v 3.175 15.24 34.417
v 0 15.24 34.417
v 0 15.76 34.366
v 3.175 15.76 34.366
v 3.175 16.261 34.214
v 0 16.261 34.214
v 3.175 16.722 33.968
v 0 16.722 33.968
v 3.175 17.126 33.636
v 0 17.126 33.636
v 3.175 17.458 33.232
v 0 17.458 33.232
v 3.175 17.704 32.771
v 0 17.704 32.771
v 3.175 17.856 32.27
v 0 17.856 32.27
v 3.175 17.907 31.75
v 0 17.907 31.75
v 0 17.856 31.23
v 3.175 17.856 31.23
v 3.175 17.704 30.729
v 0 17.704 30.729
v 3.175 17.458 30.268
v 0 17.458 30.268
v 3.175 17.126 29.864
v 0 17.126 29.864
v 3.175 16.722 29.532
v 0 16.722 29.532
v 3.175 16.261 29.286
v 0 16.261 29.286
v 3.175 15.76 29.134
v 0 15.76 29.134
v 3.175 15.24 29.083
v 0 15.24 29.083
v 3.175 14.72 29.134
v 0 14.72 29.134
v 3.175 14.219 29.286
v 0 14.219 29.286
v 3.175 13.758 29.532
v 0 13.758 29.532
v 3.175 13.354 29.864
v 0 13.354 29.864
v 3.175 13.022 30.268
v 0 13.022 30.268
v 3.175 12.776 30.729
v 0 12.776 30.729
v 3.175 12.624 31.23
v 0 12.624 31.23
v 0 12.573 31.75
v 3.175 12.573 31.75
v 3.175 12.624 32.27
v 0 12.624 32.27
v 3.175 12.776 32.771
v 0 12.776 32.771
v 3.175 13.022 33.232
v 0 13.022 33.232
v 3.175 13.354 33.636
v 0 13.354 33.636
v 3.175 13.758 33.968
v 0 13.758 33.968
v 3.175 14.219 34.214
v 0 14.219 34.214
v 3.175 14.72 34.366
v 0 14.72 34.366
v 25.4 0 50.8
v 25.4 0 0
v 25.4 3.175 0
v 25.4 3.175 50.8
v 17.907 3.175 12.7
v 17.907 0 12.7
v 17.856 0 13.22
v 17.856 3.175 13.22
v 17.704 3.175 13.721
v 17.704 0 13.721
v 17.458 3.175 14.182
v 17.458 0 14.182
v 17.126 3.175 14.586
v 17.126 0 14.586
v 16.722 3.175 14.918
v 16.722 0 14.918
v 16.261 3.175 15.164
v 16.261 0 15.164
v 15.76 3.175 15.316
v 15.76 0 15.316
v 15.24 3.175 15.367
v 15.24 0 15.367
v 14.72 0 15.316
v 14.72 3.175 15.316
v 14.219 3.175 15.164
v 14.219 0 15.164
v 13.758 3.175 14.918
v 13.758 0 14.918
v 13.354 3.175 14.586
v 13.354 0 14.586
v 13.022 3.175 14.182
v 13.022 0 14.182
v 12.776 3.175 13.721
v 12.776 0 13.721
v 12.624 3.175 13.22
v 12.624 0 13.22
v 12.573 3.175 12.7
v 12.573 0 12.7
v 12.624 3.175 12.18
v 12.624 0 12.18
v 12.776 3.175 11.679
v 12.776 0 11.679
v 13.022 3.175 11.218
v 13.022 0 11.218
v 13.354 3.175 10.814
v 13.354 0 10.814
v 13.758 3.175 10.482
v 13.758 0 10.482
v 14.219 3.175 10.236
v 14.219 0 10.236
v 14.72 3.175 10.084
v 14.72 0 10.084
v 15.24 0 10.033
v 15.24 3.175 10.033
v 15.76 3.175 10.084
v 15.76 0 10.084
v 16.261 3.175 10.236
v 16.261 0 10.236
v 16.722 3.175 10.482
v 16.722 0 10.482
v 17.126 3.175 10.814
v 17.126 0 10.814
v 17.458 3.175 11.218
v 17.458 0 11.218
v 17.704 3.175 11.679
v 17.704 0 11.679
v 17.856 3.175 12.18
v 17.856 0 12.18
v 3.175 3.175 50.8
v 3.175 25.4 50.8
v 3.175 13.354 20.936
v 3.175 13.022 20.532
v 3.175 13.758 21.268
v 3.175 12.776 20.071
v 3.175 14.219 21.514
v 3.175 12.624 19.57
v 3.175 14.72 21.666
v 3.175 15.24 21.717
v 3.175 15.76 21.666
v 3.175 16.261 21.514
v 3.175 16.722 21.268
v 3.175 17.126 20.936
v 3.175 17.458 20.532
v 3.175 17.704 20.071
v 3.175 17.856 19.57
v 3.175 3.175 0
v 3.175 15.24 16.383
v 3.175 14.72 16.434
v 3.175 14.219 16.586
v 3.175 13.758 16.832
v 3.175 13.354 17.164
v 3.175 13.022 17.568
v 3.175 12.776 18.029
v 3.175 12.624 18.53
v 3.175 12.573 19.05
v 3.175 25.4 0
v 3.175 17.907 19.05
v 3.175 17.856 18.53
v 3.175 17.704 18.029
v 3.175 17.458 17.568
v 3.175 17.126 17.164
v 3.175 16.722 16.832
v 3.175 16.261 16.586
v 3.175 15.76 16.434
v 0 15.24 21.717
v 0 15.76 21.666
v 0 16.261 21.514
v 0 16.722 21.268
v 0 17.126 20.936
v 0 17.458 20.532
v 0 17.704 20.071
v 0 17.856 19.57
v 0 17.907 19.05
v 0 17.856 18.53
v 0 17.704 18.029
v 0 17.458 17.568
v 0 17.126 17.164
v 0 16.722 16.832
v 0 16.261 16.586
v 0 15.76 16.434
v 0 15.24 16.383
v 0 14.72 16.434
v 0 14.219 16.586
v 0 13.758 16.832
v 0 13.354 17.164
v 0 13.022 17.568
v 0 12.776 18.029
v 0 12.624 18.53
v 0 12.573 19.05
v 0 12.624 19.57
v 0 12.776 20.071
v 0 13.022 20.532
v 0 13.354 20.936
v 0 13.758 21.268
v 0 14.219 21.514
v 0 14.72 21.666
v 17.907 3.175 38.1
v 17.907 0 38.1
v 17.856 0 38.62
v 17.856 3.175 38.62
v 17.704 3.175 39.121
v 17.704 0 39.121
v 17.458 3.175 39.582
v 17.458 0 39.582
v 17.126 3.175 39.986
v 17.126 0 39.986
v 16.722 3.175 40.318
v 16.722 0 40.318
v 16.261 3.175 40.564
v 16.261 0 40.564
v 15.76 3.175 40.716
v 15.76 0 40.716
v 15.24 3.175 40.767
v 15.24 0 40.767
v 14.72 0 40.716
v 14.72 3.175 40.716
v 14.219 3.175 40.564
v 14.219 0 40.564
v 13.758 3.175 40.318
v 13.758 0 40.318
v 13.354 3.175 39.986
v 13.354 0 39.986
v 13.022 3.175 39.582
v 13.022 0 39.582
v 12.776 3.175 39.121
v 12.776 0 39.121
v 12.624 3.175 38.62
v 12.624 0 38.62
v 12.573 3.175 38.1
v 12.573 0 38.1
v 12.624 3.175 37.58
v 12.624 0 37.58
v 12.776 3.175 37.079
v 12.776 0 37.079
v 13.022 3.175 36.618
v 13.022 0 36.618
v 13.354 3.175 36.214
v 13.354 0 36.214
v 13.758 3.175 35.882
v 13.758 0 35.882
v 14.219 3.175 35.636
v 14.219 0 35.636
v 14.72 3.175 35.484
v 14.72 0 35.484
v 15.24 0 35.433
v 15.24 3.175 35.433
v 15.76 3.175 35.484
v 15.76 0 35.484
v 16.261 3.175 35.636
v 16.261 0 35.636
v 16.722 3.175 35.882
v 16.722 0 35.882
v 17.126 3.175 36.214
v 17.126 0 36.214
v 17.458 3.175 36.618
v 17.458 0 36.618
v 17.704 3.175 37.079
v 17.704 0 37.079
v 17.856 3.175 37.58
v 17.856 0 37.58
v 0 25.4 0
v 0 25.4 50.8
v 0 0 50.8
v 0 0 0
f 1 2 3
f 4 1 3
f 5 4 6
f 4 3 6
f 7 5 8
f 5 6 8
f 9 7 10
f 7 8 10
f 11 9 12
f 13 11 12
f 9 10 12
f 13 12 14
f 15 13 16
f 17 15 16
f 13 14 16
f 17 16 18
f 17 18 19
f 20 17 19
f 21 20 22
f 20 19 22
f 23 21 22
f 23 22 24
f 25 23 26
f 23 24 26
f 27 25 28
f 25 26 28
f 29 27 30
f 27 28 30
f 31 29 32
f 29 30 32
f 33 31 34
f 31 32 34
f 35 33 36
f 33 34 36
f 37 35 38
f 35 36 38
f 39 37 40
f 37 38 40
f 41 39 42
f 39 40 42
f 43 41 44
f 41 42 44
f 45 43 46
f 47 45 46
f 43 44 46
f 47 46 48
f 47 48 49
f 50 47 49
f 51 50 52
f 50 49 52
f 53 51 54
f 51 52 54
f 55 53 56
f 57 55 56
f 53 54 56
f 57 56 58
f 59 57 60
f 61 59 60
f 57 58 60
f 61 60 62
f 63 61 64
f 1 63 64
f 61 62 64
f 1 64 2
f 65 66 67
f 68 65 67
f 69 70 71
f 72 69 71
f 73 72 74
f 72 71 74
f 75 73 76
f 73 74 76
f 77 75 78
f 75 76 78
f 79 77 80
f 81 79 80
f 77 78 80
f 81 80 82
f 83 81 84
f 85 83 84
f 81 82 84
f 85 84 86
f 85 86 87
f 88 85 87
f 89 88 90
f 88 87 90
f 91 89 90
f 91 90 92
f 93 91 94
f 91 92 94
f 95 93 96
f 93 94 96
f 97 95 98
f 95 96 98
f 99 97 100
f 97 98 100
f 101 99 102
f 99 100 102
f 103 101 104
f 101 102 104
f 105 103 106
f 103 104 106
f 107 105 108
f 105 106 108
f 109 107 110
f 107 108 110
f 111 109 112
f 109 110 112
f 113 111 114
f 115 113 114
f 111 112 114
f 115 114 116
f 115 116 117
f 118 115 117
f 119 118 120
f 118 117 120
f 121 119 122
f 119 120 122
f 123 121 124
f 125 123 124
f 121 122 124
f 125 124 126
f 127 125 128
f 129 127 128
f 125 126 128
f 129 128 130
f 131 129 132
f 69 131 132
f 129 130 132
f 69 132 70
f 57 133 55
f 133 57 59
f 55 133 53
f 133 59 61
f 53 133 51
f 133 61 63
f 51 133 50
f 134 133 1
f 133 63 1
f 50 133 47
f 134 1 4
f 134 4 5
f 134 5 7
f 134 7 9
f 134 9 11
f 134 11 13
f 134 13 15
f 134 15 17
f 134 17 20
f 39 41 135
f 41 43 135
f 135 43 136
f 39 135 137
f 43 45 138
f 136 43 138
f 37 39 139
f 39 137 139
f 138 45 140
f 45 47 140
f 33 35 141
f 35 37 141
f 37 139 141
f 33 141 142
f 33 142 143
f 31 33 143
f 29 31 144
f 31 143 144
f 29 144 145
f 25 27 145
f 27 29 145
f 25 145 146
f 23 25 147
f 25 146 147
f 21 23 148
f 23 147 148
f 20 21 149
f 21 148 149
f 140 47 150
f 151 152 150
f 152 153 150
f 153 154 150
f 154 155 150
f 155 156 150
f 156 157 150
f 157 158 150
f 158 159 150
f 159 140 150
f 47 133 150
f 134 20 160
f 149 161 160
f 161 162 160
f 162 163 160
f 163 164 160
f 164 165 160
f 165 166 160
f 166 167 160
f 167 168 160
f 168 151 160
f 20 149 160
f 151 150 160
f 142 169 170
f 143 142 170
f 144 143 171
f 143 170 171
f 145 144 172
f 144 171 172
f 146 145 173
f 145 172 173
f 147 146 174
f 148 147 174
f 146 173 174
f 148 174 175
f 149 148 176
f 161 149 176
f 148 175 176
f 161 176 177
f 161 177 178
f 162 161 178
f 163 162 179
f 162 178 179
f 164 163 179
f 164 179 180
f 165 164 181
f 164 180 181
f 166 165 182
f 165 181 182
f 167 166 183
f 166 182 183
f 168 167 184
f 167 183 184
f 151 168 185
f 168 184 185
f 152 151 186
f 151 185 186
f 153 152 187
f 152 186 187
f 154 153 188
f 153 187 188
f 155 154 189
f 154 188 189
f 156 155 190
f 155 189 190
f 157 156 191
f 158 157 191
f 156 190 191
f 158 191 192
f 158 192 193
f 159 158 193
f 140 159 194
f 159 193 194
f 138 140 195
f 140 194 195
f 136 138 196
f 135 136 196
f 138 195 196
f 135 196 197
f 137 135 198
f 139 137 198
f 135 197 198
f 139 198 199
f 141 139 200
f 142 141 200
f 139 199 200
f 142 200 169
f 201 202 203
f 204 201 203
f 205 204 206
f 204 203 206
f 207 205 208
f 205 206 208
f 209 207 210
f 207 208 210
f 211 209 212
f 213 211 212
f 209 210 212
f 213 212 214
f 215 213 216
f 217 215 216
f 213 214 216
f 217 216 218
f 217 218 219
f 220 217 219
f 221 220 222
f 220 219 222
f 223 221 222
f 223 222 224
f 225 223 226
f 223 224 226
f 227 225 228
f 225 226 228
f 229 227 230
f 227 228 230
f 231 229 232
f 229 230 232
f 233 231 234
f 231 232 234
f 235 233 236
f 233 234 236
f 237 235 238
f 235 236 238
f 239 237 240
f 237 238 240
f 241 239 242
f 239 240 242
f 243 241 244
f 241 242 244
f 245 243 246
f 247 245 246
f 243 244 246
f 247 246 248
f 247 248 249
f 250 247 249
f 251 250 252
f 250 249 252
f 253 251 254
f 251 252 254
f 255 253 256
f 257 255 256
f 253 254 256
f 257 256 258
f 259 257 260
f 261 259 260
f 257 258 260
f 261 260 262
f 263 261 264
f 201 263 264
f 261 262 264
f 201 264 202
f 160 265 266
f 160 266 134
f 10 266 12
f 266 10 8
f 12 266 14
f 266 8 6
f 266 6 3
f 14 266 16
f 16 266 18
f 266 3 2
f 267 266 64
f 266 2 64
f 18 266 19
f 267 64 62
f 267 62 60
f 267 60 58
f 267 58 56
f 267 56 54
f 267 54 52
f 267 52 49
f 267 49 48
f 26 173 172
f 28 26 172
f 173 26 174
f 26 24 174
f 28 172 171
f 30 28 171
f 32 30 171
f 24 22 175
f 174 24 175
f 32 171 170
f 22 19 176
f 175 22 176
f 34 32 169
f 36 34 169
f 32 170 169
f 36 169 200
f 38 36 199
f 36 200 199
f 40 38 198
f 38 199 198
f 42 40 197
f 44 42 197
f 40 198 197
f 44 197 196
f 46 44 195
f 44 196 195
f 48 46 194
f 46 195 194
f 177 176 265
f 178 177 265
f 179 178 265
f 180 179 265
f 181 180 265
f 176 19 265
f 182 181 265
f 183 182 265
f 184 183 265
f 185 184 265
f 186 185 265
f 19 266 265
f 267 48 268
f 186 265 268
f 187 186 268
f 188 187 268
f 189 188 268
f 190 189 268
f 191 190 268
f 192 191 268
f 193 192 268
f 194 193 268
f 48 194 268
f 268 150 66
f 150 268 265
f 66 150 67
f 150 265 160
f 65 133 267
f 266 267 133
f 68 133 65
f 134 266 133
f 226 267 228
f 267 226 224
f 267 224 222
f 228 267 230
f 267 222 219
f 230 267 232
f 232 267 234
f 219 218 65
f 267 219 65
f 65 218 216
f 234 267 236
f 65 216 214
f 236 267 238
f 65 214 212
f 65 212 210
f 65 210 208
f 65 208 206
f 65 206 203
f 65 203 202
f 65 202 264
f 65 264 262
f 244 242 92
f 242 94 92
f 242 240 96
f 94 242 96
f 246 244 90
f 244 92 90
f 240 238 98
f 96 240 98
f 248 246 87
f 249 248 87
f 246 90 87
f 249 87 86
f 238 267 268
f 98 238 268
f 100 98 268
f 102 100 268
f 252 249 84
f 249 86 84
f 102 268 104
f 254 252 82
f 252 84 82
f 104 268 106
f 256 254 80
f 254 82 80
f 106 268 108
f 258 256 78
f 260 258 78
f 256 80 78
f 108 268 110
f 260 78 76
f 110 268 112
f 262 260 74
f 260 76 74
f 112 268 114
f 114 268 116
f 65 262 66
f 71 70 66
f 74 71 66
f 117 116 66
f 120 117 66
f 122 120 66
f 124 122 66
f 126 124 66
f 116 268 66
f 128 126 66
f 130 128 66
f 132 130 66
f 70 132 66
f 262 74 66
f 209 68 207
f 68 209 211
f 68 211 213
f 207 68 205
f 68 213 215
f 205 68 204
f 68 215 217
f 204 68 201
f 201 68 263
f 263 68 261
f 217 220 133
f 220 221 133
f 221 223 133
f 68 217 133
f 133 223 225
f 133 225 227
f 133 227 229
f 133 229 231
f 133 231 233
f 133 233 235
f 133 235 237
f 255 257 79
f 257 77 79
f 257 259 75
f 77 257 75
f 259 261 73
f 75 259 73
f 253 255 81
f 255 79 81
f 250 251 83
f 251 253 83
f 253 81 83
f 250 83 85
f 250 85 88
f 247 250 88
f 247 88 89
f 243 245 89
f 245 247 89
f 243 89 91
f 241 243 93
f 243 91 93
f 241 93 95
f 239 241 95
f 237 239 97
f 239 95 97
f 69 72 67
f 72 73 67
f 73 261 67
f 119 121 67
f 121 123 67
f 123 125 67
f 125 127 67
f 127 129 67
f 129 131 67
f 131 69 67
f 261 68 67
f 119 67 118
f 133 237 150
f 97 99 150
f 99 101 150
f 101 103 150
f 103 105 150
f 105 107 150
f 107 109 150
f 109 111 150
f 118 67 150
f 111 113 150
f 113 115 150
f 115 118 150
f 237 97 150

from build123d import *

# Parameters (mm, degrees)
SKETCH2_W           = 22.225
SKETCH2_H           = 3.175
SKETCH2_W_2         = 3.175
SKETCH2_H_2         = 22.225
BOSS_EXTRUDE1_DEPTH = 50.8
SKETCH3_R           = 2.667
CUT_EXTRUDE1_DEPTH  = 3.175
SKETCH4_R           = 2.667
CUT_EXTRUDE2_DEPTH  = 3.175


with BuildPart() as part:
    # Sketch2 → Boss-Extrude1 (new body)
    with BuildSketch(Plane.XY):
        with Locations((14.2875, 1.5875)):
            Rectangle(SKETCH2_W, SKETCH2_H)
        with Locations((1.5875, 1.5875)):
            Rectangle(SKETCH2_W_2, SKETCH2_H)
        with Locations((1.5875, 14.2875)):
            Rectangle(SKETCH2_W_2, SKETCH2_H_2)
    extrude(amount=BOSS_EXTRUDE1_DEPTH)

    # Sketch3 → Cut-Extrude1 (cut)
    with BuildSketch(Plane.ZY):
        with Locations((19.05, 15.24)):
            Circle(SKETCH3_R)
        with Locations((31.75, 15.24)):
            Circle(SKETCH3_R)
    extrude(amount=-CUT_EXTRUDE1_DEPTH, mode=Mode.SUBTRACT)

    # Sketch4 → Cut-Extrude2 (cut)
    with BuildSketch(Plane.XZ):
        with Locations((15.24, 38.1)):
            Circle(SKETCH4_R)
        with Locations((15.24, 12.7)):
            Circle(SKETCH4_R)
    extrude(amount=-CUT_EXTRUDE2_DEPTH, mode=Mode.SUBTRACT)


solid = part.part
